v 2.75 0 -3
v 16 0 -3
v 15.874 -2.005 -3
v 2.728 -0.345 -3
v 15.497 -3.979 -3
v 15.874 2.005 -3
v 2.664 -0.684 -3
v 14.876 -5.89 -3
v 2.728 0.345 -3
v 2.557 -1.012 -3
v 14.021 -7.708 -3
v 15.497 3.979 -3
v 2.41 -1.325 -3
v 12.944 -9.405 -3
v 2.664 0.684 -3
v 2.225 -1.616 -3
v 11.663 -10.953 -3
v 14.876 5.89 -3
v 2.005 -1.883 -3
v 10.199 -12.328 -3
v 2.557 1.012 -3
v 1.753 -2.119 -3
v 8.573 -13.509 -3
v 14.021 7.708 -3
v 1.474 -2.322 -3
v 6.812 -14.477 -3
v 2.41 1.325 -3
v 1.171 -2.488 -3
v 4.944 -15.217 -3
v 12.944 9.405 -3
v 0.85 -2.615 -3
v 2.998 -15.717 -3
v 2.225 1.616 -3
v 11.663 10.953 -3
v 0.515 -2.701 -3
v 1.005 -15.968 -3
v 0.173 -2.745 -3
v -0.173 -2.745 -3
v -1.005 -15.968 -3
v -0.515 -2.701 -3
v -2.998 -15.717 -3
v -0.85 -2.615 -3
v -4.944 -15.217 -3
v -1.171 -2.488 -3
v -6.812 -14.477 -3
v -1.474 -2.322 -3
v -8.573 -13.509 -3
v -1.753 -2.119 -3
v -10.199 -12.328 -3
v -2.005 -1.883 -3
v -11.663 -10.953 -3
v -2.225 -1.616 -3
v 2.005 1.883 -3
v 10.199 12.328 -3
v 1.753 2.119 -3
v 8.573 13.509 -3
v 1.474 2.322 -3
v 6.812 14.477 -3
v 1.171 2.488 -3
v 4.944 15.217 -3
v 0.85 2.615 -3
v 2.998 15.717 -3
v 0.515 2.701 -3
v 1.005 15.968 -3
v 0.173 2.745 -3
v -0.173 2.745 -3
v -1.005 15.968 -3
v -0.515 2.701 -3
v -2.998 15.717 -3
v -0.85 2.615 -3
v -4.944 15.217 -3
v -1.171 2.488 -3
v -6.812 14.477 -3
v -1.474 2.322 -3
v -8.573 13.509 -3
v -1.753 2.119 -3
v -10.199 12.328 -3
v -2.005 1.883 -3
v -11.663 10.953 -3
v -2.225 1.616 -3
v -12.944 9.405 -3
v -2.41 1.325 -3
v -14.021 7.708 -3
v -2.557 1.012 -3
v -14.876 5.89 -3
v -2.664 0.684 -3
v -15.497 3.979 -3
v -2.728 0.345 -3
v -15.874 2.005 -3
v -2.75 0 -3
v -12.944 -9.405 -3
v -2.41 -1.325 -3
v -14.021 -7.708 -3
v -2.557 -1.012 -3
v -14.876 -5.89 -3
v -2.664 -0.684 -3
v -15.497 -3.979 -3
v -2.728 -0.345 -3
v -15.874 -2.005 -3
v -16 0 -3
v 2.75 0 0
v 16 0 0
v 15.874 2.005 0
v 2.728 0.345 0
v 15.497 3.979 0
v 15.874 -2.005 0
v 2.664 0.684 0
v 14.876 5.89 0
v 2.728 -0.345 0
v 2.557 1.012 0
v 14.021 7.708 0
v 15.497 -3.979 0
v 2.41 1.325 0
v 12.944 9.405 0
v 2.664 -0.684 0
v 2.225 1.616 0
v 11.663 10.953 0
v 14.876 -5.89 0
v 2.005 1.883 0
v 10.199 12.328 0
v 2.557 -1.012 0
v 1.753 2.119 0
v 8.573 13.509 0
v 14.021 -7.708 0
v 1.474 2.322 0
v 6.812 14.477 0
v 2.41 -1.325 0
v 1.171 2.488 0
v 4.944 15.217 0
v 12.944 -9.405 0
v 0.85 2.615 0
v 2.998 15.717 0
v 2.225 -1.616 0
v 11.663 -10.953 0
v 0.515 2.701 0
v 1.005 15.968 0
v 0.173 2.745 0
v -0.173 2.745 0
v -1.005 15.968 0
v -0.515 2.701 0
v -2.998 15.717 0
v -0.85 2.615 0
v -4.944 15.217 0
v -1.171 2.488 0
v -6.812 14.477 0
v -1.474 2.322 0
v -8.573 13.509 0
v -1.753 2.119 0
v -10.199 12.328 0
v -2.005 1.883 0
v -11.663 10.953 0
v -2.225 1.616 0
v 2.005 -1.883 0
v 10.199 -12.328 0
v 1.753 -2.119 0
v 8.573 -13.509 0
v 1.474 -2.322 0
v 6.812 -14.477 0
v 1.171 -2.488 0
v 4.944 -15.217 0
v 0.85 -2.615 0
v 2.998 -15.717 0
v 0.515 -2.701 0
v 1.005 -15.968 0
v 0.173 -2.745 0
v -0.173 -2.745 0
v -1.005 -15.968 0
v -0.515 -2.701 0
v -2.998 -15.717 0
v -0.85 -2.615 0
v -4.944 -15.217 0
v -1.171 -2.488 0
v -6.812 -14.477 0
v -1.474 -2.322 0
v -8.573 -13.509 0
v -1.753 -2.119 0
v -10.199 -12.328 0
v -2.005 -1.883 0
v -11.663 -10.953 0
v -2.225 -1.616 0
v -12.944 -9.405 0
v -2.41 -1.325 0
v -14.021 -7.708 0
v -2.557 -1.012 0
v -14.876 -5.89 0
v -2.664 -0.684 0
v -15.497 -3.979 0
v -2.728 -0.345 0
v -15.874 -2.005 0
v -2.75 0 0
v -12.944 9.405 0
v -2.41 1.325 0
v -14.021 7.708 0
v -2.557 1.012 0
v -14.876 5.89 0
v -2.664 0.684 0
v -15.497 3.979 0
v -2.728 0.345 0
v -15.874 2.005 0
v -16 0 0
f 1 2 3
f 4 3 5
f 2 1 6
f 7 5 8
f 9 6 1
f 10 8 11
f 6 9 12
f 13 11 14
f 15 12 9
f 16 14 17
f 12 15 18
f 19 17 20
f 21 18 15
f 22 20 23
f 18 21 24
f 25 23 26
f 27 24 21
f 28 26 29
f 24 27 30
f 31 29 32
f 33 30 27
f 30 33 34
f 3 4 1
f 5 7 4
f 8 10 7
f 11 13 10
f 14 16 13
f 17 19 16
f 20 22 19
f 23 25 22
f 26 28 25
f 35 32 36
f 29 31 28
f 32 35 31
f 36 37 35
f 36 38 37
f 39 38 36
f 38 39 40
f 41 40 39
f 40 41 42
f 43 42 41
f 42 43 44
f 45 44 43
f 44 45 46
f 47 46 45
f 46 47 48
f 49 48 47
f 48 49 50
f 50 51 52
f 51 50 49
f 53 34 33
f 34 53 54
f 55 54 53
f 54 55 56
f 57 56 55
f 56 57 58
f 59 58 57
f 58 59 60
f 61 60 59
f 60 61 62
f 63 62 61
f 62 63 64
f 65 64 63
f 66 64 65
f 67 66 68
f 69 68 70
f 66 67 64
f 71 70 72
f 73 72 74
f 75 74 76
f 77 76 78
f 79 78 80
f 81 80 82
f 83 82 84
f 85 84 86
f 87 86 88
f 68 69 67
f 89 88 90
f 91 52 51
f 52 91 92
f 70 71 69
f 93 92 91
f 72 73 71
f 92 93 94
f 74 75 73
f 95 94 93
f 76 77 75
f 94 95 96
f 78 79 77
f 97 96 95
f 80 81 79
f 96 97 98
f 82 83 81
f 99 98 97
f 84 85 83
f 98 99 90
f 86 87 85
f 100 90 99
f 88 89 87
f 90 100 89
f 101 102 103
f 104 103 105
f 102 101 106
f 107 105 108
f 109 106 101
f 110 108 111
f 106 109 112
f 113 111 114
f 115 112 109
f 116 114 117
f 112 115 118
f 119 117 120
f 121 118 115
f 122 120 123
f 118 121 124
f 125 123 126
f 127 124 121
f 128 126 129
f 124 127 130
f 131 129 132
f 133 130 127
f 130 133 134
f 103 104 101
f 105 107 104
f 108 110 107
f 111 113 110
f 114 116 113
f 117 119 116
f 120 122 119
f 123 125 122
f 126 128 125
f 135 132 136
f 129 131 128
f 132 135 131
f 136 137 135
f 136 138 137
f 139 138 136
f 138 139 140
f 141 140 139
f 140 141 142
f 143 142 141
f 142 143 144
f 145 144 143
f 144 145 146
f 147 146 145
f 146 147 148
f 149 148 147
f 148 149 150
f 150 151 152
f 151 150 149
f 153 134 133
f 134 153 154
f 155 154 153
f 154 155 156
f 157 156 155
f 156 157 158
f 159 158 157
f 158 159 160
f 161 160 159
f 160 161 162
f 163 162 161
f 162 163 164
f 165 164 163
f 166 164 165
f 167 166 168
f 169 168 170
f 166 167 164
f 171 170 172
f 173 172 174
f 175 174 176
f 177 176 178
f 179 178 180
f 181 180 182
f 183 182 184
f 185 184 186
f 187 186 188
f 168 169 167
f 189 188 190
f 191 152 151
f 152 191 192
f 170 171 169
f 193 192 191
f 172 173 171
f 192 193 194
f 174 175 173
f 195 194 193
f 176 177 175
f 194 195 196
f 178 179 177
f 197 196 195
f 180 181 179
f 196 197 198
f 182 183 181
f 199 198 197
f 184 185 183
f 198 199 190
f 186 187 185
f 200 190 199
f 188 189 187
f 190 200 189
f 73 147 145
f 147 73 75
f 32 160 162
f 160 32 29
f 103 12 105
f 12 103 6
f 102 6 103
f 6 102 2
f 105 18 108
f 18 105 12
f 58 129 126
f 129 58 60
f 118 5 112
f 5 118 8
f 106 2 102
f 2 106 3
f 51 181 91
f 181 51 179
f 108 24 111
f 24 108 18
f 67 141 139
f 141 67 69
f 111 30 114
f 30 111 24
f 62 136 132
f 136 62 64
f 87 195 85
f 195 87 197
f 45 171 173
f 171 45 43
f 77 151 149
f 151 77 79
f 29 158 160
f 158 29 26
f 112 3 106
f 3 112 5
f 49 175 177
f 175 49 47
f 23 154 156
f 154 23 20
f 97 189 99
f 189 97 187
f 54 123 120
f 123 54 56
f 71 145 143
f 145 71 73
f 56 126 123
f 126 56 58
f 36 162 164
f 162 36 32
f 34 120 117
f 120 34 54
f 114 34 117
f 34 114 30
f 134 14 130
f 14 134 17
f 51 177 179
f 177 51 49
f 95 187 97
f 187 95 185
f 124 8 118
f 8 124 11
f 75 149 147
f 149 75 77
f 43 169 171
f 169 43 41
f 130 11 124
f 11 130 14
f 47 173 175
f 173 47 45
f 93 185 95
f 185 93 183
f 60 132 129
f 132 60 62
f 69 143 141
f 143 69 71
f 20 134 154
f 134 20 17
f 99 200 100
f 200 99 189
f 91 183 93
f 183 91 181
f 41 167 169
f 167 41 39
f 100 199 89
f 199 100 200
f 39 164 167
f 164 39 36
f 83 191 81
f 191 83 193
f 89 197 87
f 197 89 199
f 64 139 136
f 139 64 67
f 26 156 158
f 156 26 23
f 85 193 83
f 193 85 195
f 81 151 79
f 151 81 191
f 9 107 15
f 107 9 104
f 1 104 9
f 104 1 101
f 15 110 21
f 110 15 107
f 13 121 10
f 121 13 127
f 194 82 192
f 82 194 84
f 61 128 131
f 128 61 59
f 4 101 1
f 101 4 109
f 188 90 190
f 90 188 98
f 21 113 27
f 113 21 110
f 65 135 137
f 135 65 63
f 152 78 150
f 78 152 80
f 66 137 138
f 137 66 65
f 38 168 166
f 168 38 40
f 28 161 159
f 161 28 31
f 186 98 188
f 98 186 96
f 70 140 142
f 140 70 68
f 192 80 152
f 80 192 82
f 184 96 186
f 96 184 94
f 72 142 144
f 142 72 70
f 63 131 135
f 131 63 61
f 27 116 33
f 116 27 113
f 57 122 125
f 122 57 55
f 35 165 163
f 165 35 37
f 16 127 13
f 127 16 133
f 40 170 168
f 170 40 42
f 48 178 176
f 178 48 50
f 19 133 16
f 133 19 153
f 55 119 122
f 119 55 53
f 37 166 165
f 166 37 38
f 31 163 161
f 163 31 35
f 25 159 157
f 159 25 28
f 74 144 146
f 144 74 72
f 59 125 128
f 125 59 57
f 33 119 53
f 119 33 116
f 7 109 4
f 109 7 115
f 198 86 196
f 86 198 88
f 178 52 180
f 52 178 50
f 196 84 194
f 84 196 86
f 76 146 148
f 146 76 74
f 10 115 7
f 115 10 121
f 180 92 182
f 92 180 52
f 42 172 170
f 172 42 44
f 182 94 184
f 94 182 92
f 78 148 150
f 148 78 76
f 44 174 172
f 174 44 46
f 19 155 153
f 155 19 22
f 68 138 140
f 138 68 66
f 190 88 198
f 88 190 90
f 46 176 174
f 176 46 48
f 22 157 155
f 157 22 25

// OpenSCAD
$fn = 50;


difference() {
	union() {
		translate(v = [0, 0, -3.0000000000]) {
			cylinder(h = 3, r = 10.0000000000);
		}
		translate(v = [0, 0, -3.0000000000]) {
			cylinder(h = 3, r = 16.0000000000);
		}
	}
	union() {
		#translate(v = [0, 0, -3]) {
			cylinder(h = 3, r = 2.7500000000);
		}
	}
}
